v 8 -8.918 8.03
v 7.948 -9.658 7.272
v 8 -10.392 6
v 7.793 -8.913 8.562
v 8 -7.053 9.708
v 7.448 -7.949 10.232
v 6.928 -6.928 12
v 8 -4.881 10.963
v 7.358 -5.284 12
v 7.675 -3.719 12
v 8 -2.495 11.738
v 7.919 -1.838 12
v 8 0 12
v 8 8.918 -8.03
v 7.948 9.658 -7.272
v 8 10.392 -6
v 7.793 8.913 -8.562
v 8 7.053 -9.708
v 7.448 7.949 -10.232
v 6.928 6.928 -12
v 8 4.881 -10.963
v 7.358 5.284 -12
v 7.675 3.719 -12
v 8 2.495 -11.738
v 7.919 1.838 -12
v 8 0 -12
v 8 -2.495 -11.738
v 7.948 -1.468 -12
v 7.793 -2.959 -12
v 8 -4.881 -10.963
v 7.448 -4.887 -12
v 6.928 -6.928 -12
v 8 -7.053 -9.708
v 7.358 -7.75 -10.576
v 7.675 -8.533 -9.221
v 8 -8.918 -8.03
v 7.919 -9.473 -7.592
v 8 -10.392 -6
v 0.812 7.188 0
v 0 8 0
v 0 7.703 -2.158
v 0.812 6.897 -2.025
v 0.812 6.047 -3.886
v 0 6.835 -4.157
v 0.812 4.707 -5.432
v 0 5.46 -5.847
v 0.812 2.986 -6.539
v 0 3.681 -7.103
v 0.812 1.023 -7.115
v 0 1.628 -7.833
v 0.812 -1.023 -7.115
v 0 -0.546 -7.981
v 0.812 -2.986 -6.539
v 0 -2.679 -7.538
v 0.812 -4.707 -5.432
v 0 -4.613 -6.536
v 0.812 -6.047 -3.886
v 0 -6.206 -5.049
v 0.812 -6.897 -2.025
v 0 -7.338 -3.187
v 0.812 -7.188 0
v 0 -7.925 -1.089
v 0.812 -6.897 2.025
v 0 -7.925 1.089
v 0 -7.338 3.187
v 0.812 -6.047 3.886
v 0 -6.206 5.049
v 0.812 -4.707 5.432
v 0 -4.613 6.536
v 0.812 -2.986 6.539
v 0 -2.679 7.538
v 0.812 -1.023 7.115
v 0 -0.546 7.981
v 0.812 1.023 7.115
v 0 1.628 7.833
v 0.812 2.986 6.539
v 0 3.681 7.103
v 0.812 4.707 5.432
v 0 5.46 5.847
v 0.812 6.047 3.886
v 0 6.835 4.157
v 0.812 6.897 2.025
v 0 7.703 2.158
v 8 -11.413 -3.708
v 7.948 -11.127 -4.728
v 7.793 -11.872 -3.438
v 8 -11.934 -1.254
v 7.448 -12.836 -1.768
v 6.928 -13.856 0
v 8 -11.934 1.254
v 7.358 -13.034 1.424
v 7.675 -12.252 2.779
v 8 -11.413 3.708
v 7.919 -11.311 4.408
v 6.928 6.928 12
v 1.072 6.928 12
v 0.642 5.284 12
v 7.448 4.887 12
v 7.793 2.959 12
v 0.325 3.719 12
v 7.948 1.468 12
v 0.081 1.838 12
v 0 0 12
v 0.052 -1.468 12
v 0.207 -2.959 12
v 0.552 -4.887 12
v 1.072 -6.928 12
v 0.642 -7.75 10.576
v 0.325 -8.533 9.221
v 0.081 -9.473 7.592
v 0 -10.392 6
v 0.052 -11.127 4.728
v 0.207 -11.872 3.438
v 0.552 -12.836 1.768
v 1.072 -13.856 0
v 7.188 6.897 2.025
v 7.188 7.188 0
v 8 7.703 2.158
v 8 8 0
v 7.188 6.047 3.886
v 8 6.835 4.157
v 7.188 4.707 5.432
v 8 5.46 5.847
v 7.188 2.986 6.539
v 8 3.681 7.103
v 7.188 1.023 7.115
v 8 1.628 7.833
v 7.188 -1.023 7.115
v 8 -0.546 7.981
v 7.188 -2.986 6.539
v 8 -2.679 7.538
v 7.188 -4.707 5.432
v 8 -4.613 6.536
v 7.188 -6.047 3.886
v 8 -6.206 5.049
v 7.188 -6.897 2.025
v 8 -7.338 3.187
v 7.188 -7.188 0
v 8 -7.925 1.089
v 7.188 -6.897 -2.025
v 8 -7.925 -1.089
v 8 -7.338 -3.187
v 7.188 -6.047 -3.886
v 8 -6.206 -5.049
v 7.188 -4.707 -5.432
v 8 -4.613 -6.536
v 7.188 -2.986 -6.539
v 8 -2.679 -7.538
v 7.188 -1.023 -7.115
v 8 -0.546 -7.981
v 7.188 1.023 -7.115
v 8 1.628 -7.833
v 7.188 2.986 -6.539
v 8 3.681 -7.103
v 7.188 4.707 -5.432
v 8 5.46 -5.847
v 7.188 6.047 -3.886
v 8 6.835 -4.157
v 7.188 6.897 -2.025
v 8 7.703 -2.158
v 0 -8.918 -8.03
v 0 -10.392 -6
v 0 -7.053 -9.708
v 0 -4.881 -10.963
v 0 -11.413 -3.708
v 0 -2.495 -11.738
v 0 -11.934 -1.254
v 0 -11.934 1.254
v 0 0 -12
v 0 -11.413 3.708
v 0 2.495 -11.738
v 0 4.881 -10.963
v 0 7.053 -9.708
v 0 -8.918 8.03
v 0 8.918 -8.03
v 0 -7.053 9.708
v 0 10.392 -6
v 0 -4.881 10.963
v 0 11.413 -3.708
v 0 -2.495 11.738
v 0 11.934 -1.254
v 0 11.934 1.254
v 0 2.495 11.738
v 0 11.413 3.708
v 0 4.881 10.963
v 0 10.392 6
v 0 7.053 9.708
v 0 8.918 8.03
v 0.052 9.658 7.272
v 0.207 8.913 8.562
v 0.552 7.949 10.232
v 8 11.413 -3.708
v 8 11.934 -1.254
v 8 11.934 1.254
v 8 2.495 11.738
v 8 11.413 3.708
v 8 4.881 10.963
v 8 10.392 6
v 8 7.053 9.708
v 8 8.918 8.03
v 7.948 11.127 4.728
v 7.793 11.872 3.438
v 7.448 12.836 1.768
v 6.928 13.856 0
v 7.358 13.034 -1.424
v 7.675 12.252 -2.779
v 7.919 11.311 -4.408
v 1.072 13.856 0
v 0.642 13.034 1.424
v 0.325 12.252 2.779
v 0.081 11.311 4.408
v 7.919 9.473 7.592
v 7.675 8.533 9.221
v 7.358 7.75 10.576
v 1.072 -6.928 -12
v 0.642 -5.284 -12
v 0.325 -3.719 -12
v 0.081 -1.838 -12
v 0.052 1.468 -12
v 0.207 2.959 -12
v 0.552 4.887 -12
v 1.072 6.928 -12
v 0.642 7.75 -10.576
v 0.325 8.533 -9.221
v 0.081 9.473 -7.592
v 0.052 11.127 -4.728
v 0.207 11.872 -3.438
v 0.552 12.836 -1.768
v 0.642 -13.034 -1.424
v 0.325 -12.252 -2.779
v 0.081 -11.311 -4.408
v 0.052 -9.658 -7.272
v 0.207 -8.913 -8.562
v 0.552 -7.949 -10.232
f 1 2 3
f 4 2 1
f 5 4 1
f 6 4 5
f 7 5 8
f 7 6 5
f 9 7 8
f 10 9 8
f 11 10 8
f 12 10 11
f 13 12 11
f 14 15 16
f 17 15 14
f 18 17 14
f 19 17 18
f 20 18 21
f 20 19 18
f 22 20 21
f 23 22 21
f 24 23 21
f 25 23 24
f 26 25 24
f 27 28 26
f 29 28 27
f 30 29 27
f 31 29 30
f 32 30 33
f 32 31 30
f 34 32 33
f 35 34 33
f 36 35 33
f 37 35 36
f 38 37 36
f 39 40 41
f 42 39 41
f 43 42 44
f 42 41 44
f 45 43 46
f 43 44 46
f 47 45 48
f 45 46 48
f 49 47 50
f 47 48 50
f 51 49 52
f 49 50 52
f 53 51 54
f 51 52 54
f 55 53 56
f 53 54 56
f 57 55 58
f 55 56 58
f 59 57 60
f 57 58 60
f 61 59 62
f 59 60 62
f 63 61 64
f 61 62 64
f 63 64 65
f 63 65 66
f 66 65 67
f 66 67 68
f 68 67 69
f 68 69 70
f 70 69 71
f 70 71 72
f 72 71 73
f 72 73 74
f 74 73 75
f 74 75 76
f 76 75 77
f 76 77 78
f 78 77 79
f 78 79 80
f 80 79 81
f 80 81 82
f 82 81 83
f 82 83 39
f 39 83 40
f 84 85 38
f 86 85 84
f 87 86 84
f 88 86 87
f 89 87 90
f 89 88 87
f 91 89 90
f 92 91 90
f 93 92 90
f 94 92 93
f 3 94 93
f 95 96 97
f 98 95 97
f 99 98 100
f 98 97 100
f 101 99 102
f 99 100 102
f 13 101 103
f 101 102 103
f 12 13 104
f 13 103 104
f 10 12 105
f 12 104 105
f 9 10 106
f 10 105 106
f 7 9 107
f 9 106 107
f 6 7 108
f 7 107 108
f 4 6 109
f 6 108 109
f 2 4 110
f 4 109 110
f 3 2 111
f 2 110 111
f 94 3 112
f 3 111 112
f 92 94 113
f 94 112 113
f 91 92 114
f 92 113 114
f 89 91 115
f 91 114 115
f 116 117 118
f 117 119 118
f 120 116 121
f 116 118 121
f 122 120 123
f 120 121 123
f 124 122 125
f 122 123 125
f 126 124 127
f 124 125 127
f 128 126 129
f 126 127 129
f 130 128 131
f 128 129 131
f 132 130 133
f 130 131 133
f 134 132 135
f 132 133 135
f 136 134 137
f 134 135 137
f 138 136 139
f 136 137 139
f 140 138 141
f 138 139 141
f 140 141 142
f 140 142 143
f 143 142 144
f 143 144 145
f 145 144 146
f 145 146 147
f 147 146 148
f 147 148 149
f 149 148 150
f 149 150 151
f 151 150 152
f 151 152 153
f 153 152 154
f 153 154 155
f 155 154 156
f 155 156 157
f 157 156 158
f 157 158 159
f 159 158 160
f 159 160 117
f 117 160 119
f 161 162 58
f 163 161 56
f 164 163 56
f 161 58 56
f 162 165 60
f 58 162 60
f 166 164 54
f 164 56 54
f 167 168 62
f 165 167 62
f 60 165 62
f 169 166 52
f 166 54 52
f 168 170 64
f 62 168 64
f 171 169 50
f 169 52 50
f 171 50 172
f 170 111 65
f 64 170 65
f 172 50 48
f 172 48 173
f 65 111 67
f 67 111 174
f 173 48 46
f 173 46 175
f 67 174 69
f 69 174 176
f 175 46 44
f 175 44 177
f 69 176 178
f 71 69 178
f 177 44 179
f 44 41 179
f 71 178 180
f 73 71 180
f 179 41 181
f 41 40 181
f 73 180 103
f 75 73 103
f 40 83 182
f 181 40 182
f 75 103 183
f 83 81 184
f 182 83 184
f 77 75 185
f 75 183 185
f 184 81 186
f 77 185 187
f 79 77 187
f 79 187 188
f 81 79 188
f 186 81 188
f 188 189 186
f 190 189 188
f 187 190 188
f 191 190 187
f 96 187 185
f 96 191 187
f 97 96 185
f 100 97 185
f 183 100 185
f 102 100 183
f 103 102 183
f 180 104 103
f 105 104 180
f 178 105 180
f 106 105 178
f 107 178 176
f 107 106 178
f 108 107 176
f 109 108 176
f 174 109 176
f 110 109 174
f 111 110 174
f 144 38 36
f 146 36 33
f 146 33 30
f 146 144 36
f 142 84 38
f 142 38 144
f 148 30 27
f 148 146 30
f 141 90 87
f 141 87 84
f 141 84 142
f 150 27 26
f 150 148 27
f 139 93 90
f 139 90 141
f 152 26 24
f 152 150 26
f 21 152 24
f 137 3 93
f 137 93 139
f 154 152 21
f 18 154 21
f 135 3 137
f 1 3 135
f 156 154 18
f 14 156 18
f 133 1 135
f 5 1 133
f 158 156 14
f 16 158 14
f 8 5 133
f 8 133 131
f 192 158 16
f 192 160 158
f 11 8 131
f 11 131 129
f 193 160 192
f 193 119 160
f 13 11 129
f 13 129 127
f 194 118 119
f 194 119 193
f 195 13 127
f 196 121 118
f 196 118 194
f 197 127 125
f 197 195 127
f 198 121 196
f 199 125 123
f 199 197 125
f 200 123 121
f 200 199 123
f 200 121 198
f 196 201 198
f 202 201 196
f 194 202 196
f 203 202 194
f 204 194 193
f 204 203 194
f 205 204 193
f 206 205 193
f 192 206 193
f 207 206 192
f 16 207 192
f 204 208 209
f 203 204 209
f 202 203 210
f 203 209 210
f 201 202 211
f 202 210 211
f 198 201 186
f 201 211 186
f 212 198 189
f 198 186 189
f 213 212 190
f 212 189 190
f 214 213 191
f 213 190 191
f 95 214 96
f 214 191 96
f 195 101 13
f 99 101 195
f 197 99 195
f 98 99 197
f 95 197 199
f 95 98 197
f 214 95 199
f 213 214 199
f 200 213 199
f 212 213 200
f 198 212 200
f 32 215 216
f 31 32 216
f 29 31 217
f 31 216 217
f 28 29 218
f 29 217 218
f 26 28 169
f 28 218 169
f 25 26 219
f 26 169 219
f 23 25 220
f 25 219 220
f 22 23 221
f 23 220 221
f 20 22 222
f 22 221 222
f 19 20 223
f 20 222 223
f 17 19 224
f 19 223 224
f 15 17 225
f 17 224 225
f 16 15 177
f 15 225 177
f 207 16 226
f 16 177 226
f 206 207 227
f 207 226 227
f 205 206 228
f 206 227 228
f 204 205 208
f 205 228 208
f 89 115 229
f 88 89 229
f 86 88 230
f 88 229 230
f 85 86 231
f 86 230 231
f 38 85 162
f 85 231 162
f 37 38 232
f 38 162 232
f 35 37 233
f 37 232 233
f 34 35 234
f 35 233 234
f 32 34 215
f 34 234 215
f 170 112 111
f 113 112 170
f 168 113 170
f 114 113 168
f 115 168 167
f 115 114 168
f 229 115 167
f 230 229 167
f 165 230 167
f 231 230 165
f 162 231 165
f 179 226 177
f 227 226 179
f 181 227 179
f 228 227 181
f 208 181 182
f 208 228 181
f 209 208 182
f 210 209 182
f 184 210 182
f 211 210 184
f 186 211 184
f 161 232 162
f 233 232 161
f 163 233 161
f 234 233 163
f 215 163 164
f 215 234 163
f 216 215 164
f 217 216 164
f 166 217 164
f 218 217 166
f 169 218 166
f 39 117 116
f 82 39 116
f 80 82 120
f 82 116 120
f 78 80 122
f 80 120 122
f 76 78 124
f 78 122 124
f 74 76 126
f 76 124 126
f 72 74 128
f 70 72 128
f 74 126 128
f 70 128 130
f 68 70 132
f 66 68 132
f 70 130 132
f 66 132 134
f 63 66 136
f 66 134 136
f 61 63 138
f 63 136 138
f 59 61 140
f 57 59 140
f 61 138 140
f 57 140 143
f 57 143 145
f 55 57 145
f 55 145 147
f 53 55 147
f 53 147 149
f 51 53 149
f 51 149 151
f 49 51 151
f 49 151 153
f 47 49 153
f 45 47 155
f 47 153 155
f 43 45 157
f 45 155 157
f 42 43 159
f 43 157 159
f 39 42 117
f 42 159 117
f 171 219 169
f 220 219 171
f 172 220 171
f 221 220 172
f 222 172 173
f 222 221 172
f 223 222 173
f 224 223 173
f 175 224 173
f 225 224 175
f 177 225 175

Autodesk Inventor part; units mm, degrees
sketch "Skizze_1" plane through (0, 0, 0) normal (0, 0, 1) x (1, 0, 0)
  line L0 (8, 0) -> (0, 0)
  line L1 (0, 0) -> (0, 12)
  line L2 (0, 12) -> (1.3856, 14.4)
  line L3 (1.3856, 14.4) -> (6.6144, 14.4)
  line L4 (6.6144, 14.4) -> (8, 12)
  line L5 (8, 12) -> (8, 0)
  line L6 (8, 0) -> (0, 0)
revolve "Revolution1" add sketch "Skizze_1" angle 360 about axis through (8, 0, 0) along (1, 0, 0)
sketch "Skizze_2_ALT_Drilling_1" plane through (0, 0, 0) normal (0, 0, 1) x (1, 0, 0)
  line L0 (8, 0) -> (0, 0)
  line L1 (0, 0) -> (0, 8)
  line L2 (0, 8) -> (0.8119, 7.1881)
  line L3 (0.8119, 7.1881) -> (7.1881, 7.1881)
  line L4 (7.1881, 7.1881) -> (8, 8)
  line L5 (8, 8) -> (8, 0)
  line L6 (8, 0) -> (0, 0)
revolve "Revolution2" cut sketch "Skizze_2_ALT_Drilling_1" angle 360 about axis through (8, 0, 0) along (1, 0, 0)
sketch "Skizze_3" plane through (0, 0, 0) normal (1, 0, 0) x (0, 1, 0)
  line L0 (-24, 24) -> (-24, -24)
  line L1 (-24, -24) -> (24, -24)
  line L2 (24, -24) -> (24, 24)
  line L3 (24, 24) -> (-24, 24)
  line L4 (-6.9282, 12) -> (-13.8564, 0)
  line L5 (-13.8564, 0) -> (-6.9282, -12)
  line L6 (-6.9282, -12) -> (6.9282, -12)
  line L7 (6.9282, -12) -> (13.8564, 0)
  line L8 (13.8564, 0) -> (6.9282, 12)
  line L9 (6.9282, 12) -> (-6.9282, 12)
extrude "Extrusion1" cut sketch "Skizze_3" along normal blind 8
ref_plane "GIE1_XY" through (0, 0, 0) normal (1, 0, 0) x (0, 0, -1)
ref_plane "GIE1_YZ" through (0, 0, 0) normal (0, 0, -1) x (0, 1, 0)
ref_plane "GIE1_ZX" through (0, 0, 0) normal (0, 1, 0) x (1, 0, 0)
properties part number "V-12-16"
